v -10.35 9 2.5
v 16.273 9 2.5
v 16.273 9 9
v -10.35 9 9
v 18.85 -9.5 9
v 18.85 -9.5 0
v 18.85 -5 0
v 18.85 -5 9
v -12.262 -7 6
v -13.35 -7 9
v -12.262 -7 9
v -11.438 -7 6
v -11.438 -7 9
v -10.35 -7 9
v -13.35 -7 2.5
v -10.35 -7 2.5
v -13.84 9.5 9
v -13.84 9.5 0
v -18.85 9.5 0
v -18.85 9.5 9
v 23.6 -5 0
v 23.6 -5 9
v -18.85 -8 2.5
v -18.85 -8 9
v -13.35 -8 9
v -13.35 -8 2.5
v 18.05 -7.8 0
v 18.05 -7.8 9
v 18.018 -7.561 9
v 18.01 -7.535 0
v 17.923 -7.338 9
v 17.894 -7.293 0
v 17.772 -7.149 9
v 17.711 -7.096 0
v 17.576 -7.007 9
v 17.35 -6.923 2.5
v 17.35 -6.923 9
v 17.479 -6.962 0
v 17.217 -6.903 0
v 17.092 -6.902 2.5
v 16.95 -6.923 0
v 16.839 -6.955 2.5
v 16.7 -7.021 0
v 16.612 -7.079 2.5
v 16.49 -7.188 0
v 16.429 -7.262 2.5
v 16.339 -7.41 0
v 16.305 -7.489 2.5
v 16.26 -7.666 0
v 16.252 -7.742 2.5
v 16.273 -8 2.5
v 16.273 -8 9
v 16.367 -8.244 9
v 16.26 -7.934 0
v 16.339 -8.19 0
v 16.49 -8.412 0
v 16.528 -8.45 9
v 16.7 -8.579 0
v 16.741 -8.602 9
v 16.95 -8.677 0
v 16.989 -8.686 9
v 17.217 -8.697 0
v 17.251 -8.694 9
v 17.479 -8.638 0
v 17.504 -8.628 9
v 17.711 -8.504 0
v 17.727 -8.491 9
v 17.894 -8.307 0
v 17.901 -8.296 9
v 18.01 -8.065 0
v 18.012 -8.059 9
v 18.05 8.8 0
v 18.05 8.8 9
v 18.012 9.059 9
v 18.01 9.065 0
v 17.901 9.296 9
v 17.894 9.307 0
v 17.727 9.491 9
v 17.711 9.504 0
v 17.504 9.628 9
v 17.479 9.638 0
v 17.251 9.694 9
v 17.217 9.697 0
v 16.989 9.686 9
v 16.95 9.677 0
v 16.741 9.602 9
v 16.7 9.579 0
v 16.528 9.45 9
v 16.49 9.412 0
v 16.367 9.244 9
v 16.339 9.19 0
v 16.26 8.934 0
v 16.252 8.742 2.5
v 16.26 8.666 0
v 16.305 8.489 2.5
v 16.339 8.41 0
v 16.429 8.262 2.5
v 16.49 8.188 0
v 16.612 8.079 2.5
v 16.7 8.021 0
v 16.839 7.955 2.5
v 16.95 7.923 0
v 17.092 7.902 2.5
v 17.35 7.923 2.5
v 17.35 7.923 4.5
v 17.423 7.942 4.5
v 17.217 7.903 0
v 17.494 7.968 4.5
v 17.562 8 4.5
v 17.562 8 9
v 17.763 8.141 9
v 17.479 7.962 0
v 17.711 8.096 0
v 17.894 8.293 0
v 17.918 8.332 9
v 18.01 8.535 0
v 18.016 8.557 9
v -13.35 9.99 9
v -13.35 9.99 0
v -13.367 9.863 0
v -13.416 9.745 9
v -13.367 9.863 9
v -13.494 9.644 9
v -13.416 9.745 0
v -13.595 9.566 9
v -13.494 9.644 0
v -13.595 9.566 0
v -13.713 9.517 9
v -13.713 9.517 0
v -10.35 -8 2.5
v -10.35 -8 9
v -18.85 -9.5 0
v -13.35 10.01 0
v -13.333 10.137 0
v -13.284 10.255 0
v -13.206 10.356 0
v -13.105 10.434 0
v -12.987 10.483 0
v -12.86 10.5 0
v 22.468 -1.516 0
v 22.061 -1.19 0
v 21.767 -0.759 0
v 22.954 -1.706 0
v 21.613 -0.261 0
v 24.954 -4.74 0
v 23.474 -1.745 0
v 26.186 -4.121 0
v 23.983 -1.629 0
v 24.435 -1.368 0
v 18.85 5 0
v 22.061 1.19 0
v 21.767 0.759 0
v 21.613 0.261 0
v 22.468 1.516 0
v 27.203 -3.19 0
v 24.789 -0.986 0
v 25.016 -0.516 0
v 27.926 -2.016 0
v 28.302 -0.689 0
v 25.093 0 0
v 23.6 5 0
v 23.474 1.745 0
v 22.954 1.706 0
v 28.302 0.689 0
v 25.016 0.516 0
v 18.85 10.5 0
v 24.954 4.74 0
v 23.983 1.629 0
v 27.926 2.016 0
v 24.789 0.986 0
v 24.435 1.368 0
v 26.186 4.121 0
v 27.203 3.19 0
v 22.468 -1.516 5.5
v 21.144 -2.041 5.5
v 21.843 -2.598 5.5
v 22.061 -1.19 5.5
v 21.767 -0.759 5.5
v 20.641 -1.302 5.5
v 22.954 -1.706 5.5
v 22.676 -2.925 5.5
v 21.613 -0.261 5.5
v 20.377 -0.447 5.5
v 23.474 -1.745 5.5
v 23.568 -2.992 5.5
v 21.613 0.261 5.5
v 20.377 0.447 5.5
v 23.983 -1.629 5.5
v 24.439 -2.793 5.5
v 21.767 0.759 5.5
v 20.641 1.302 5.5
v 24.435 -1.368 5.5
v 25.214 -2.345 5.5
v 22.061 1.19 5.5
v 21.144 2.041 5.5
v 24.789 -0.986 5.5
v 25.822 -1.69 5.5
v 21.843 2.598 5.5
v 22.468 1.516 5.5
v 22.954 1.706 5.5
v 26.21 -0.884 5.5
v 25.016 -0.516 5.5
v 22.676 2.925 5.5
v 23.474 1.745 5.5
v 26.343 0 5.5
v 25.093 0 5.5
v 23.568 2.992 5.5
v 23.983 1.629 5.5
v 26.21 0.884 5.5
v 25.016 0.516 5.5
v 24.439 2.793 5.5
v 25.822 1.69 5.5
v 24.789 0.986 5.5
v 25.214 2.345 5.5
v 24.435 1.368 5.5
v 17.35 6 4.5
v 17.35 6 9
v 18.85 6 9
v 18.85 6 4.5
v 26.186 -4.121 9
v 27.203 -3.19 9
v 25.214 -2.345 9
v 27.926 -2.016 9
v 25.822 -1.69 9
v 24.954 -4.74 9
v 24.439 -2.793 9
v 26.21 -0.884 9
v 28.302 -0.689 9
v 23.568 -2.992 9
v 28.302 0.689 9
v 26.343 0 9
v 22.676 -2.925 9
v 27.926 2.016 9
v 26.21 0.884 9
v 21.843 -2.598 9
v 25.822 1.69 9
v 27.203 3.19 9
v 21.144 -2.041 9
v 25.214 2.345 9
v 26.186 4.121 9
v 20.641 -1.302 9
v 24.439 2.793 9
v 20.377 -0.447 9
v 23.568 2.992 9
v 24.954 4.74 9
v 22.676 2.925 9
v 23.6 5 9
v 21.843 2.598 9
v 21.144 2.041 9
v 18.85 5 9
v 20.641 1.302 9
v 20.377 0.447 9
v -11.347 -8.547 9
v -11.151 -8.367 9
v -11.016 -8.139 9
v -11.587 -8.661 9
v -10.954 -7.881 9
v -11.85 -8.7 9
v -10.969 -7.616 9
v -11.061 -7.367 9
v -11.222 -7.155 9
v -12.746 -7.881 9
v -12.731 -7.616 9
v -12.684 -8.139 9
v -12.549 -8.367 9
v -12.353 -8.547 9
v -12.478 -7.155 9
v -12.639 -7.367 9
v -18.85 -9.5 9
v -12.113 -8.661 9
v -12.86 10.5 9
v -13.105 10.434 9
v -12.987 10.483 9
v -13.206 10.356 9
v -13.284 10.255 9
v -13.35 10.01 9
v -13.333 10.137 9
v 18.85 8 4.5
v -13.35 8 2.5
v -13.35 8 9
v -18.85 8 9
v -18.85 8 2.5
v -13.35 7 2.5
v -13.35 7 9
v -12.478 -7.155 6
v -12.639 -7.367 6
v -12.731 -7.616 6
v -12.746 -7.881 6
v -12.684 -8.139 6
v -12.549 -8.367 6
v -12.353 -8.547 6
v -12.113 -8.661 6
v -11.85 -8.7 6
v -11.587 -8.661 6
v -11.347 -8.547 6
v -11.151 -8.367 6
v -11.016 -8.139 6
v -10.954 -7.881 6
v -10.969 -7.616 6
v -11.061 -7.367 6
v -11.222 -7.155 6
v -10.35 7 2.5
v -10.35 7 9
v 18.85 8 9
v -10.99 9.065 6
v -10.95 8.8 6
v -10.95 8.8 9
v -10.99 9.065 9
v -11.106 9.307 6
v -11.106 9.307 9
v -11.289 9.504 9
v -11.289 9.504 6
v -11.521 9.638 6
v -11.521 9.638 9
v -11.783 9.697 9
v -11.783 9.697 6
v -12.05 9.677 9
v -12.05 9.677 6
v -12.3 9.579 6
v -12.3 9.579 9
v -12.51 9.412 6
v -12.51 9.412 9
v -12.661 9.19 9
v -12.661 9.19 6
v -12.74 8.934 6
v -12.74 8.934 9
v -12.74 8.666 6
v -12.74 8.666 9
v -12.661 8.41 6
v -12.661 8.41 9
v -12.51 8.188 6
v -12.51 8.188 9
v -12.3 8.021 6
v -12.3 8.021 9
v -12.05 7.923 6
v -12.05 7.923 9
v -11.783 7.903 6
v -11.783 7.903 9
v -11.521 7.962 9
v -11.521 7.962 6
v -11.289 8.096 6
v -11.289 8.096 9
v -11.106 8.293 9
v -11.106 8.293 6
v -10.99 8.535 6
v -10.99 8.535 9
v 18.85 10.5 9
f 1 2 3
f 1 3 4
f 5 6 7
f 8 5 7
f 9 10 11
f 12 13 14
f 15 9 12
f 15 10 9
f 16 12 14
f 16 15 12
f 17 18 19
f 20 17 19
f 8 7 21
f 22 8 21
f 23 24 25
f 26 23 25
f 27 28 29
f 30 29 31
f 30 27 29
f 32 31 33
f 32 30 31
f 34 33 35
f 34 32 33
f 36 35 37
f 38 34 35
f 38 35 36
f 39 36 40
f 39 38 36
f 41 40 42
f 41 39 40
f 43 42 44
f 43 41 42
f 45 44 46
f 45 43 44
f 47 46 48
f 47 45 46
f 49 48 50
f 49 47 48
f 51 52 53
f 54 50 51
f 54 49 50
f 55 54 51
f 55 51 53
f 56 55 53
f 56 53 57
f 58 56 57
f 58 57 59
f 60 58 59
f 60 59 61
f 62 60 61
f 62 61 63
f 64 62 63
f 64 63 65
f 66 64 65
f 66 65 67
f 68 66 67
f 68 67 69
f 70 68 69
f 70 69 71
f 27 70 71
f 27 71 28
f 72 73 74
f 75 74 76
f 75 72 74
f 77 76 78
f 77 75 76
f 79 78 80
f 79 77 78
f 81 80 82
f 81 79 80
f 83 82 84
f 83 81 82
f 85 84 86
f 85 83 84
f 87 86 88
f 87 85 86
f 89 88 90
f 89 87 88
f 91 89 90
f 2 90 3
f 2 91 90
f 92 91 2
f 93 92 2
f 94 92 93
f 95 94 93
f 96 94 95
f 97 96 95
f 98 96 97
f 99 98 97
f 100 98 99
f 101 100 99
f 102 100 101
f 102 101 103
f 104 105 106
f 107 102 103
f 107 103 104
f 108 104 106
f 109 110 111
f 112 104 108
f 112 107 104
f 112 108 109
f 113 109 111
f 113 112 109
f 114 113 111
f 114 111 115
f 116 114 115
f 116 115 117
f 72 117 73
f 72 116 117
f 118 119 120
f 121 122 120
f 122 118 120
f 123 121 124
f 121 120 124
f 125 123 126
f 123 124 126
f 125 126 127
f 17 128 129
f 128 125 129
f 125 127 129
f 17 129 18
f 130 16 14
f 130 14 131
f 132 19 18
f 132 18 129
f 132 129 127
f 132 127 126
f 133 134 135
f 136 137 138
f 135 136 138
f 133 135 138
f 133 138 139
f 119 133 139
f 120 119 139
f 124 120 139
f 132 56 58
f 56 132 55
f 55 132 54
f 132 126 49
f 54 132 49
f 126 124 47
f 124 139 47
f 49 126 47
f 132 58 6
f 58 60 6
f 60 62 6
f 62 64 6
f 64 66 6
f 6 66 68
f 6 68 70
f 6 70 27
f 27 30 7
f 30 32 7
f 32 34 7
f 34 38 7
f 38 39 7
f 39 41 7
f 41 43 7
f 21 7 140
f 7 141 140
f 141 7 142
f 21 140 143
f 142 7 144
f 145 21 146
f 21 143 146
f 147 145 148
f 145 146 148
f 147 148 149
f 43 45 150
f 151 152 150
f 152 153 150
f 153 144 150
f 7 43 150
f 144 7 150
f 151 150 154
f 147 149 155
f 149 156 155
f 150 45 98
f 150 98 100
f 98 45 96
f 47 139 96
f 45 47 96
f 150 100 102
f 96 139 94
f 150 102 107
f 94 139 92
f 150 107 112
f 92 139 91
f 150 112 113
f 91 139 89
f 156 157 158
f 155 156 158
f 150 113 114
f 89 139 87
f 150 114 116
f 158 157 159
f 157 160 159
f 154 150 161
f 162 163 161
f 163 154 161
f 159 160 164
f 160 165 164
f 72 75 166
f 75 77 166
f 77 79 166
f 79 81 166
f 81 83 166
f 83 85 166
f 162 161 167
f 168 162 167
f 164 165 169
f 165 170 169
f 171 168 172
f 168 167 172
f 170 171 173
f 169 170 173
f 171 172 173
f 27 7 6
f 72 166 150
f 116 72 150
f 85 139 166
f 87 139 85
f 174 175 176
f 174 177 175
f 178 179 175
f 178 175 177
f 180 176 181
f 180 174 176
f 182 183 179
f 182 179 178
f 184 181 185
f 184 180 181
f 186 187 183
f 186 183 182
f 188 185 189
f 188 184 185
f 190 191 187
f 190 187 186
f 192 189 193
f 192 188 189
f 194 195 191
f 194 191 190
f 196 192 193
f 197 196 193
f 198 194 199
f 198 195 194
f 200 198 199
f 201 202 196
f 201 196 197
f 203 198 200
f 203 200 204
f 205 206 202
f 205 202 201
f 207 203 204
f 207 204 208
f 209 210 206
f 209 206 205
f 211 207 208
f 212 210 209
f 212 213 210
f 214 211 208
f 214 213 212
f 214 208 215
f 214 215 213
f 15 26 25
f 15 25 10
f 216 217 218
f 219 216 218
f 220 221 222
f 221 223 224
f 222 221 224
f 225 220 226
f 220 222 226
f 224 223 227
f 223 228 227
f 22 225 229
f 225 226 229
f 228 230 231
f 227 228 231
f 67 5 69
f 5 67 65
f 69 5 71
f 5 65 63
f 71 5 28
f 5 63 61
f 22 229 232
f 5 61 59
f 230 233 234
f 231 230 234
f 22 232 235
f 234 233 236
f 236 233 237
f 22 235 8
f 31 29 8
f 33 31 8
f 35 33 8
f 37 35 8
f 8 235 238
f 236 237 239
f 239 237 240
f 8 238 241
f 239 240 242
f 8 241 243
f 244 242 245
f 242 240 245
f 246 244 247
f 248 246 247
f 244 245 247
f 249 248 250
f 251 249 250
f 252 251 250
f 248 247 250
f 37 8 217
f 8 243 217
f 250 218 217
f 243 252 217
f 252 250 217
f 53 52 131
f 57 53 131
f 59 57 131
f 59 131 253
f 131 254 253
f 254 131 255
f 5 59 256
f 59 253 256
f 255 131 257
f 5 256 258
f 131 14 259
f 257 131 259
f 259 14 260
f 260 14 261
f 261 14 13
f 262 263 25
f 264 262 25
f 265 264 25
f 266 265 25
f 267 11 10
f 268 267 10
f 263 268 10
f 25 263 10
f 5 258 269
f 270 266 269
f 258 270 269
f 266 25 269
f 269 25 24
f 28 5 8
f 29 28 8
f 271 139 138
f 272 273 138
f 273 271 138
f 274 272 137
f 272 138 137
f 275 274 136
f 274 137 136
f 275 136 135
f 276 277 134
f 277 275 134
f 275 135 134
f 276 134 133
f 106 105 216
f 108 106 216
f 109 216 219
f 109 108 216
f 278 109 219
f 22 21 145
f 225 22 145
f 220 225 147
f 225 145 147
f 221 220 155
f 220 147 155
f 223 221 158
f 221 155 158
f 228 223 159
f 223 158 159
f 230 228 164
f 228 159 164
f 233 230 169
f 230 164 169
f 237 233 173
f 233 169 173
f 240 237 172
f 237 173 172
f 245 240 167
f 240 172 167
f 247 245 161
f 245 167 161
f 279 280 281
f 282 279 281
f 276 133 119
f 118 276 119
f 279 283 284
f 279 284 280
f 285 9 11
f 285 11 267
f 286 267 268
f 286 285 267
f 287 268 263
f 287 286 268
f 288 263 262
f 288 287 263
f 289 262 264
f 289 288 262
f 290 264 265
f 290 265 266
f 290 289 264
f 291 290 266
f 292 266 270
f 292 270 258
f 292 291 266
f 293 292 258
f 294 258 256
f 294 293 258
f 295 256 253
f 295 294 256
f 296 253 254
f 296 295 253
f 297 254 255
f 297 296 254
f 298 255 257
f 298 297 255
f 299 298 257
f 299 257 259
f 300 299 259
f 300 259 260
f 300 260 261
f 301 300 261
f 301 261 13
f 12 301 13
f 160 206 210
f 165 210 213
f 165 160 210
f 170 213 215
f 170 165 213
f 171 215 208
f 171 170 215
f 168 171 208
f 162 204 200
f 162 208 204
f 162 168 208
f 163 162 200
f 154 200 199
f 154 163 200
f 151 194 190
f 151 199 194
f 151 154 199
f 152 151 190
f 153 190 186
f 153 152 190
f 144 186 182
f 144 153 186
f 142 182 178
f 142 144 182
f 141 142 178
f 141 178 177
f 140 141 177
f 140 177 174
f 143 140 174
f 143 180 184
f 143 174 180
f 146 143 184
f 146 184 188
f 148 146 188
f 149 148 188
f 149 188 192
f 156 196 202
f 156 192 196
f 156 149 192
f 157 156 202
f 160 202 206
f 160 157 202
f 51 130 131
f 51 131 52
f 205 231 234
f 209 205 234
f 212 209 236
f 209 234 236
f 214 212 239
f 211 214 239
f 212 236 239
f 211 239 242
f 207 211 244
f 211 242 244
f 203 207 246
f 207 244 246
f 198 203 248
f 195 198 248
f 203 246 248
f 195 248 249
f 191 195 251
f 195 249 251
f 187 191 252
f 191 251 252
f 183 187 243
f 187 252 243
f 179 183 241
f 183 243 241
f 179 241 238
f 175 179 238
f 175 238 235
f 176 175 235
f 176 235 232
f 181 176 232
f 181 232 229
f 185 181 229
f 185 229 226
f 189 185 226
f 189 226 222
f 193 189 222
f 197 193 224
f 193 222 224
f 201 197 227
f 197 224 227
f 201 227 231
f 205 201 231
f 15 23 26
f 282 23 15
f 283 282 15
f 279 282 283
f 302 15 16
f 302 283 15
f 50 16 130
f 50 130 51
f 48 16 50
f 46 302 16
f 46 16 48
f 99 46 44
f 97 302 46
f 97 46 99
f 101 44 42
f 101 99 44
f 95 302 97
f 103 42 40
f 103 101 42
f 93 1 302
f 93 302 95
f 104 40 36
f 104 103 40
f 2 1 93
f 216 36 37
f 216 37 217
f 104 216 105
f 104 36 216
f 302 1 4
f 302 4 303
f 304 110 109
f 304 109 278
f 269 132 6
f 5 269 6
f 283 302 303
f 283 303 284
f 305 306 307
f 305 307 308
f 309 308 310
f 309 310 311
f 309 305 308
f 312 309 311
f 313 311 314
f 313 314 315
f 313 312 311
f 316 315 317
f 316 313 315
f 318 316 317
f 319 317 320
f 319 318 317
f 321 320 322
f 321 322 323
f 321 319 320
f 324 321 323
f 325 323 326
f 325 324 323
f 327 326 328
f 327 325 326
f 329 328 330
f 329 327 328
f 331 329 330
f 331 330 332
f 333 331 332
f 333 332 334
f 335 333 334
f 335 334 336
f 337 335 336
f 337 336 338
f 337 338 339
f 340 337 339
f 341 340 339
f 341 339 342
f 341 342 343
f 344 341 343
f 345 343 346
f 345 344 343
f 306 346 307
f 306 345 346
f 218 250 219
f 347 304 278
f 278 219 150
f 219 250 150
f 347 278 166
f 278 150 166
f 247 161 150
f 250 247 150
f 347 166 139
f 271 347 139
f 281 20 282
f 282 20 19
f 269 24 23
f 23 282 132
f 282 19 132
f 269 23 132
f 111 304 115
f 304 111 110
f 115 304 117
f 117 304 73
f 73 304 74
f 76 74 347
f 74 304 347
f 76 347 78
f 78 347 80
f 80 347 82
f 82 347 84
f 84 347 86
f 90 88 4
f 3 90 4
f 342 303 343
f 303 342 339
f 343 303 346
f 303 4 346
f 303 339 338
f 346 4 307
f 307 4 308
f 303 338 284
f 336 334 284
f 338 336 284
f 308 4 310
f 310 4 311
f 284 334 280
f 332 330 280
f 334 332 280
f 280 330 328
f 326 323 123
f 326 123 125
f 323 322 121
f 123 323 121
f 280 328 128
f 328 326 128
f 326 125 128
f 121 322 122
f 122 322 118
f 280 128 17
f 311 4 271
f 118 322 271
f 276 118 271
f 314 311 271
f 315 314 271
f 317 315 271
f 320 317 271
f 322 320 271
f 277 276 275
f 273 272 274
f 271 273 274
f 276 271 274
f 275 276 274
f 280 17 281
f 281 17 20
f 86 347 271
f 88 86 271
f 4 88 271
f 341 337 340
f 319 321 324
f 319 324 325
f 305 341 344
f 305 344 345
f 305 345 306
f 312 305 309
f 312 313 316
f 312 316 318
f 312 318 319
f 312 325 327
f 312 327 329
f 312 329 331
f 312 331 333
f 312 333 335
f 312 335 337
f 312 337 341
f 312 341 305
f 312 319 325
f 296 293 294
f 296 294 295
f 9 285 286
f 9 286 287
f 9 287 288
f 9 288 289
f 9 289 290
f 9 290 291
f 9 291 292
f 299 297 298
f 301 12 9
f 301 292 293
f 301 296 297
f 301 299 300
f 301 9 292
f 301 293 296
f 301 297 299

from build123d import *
from build123d.topology import SkipClean

# Parameters (mm, degrees)
SKETCH1_R                        = 1.75
BOSS_EXTRUDE1_DEPTH              = 7.5
SKETCH2_R                        = 1.75
BOSS_EXTRUDE2_DEPTH              = 2.5
SKETCH3_W                        = 1.5
SKETCH3_H                        = 2
CUT_EXTRUDE1_DEPTH               = 4.5
SKETCH4_R                        = 3
CUT_EXTRUDE2_DEPTH               = 3.5
M1_6_CLEARANCE_HOLE1_OUTLINE_R   = 0.9
M1_6_CLEARANCE_HOLE1_DEPTH       = 9
M1_6_START                       = 6
M1_6_CLEARANCE_HOLE1_2_OUTLINE_R = 0.9
M1_6_CLEARANCE_HOLE1_2_DEPTH     = 3


# Read off the part's stored shape, not the designer's step: M1.6 Clearance Hole1
with BuildPart() as part:
    # Sketch1 → Boss-Extrude1 (new body)
    with BuildSketch(Plane.XY.offset(1.5)):
        with BuildLine():
            Line((18.85, -9.5), (-18.85, -9.5))
            Line((-18.85, -9.5), (-18.85, -8))
            Line((-18.85, -8), (-13.35, -8))
            Line((-13.35, -8), (-13.35, -7))
            Line((-13.35, -7), (-10.35, -7))
            Line((-10.35, -7), (-10.35, -8))
            Line((-10.35, -8), (17.35, -8))
            Line((17.35, -8), (17.35, 9))
            Line((17.35, 9), (-10.35, 9))
            Line((-10.35, 9), (-10.35, 7))
            Line((-10.35, 7), (-13.35, 7))
            Line((-13.35, 7), (-13.35, 8))
            Line((-13.35, 8), (-13.84, 8))
            Line((-13.84, 8), (-18.85, 8))
            Line((-18.85, 8), (-18.85, 9.5))
            Line((-18.85, 9.5), (-13.84, 9.5))
            ThreePointArc((-13.84, 9.5), (-13.493517677, 9.643517677), (-13.35, 9.99))
            Line((-13.35, 9.99), (-13.35, 10.01))
            ThreePointArc((-13.35, 10.01), (-13.206482323, 10.356482323), (-12.86, 10.5))
            Line((-12.86, 10.5), (18.85, 10.5))
            Line((18.85, 10.5), (18.85, 9.5))
            Line((18.85, 9.5), (18.85, 5))
            Line((18.85, 5), (23.6, 5))
            ThreePointArc((23.6, 5), (28.35, 0), (23.6, -5))
            Line((23.6, -5), (18.85, -5))
            Line((18.85, -5), (18.85, -9.5))
        make_face()
        with Locations((23.343421053, 0)):
            Circle(SKETCH1_R, mode=Mode.SUBTRACT)
    extrude(amount=BOSS_EXTRUDE1_DEPTH)

    # Sketch2 → Boss-Extrude2 (add)
    with SkipClean():  # the faces are left unmerged after this step: merging them gives an invalid solid
        with BuildSketch(Plane.XY):
            with BuildLine():
                Line((-18.85, 8), (-18.85, -8))
                Line((-18.85, -8), (-18.85, -9.5))
                Line((-18.85, -9.5), (18.85, -9.5))
                Line((18.85, -9.5), (18.85, -5))
                Line((18.85, -5), (23.6, -5))
                ThreePointArc((23.6, -5), (28.35, 0), (23.6, 5))
                Line((23.6, 5), (18.85, 5))
                Line((18.85, 5), (18.85, 10.5))
                Line((18.85, 10.5), (-12.86, 10.5))
                ThreePointArc((-12.86, 10.5), (-13.206482323, 10.356482323), (-13.35, 10.01))
                Line((-13.35, 10.01), (-13.35, 9.99))
                ThreePointArc((-13.35, 9.99), (-13.493517677, 9.643517677), (-13.84, 9.5))
                Line((-13.84, 9.5), (-18.85, 9.5))
                Line((-18.85, 9.5), (-18.85, 8))
            make_face()
            with Locations((23.343421053, 0)):
                Circle(SKETCH2_R, mode=Mode.SUBTRACT)
        extrude(amount=BOSS_EXTRUDE2_DEPTH)
    add(part.part.scale(1), mode=Mode.REPLACE)  # the faces are merged on a copy

    # Sketch3 → Cut-Extrude1 (cut)
    with BuildSketch(Plane.XY.offset(9)):
        with Locations((18.1, 7)):
            Rectangle(SKETCH3_W, SKETCH3_H)
    extrude(amount=-CUT_EXTRUDE1_DEPTH, mode=Mode.SUBTRACT)

    # Sketch4 → Cut-Extrude2 (cut)
    with BuildSketch(Plane.XY.offset(9)):
        with Locations((23.343421053, 0)):
            Circle(SKETCH4_R)
    extrude(amount=-CUT_EXTRUDE2_DEPTH, mode=Mode.SUBTRACT)

    # M1.6 Clearance Hole1 outline → M1.6 Clearance Hole1 (cut)
    with BuildSketch(Plane.XY):
        with Locations((17.15, 8.8)):
            Circle(M1_6_CLEARANCE_HOLE1_OUTLINE_R)
        with Locations((17.15, -7.8)):
            Circle(M1_6_CLEARANCE_HOLE1_OUTLINE_R)
    extrude(amount=M1_6_CLEARANCE_HOLE1_DEPTH, mode=Mode.SUBTRACT)

    # M1.6 Clearance Hole1 2 outline → M1.6 Clearance Hole1 2 (cut)
    with BuildSketch(Plane.XY.offset(M1_6_START)):
        with BuildLine():
            Line((-11.437689437, -7), (-12.262310563, -7))
            ThreePointArc((-12.262310563, -7), (-11.85, -8.7), (-11.437689437, -7))
        make_face()
        with Locations((-11.85, 8.8)):
            Circle(M1_6_CLEARANCE_HOLE1_2_OUTLINE_R)
    extrude(amount=M1_6_CLEARANCE_HOLE1_2_DEPTH, mode=Mode.SUBTRACT)


solid = part.part
